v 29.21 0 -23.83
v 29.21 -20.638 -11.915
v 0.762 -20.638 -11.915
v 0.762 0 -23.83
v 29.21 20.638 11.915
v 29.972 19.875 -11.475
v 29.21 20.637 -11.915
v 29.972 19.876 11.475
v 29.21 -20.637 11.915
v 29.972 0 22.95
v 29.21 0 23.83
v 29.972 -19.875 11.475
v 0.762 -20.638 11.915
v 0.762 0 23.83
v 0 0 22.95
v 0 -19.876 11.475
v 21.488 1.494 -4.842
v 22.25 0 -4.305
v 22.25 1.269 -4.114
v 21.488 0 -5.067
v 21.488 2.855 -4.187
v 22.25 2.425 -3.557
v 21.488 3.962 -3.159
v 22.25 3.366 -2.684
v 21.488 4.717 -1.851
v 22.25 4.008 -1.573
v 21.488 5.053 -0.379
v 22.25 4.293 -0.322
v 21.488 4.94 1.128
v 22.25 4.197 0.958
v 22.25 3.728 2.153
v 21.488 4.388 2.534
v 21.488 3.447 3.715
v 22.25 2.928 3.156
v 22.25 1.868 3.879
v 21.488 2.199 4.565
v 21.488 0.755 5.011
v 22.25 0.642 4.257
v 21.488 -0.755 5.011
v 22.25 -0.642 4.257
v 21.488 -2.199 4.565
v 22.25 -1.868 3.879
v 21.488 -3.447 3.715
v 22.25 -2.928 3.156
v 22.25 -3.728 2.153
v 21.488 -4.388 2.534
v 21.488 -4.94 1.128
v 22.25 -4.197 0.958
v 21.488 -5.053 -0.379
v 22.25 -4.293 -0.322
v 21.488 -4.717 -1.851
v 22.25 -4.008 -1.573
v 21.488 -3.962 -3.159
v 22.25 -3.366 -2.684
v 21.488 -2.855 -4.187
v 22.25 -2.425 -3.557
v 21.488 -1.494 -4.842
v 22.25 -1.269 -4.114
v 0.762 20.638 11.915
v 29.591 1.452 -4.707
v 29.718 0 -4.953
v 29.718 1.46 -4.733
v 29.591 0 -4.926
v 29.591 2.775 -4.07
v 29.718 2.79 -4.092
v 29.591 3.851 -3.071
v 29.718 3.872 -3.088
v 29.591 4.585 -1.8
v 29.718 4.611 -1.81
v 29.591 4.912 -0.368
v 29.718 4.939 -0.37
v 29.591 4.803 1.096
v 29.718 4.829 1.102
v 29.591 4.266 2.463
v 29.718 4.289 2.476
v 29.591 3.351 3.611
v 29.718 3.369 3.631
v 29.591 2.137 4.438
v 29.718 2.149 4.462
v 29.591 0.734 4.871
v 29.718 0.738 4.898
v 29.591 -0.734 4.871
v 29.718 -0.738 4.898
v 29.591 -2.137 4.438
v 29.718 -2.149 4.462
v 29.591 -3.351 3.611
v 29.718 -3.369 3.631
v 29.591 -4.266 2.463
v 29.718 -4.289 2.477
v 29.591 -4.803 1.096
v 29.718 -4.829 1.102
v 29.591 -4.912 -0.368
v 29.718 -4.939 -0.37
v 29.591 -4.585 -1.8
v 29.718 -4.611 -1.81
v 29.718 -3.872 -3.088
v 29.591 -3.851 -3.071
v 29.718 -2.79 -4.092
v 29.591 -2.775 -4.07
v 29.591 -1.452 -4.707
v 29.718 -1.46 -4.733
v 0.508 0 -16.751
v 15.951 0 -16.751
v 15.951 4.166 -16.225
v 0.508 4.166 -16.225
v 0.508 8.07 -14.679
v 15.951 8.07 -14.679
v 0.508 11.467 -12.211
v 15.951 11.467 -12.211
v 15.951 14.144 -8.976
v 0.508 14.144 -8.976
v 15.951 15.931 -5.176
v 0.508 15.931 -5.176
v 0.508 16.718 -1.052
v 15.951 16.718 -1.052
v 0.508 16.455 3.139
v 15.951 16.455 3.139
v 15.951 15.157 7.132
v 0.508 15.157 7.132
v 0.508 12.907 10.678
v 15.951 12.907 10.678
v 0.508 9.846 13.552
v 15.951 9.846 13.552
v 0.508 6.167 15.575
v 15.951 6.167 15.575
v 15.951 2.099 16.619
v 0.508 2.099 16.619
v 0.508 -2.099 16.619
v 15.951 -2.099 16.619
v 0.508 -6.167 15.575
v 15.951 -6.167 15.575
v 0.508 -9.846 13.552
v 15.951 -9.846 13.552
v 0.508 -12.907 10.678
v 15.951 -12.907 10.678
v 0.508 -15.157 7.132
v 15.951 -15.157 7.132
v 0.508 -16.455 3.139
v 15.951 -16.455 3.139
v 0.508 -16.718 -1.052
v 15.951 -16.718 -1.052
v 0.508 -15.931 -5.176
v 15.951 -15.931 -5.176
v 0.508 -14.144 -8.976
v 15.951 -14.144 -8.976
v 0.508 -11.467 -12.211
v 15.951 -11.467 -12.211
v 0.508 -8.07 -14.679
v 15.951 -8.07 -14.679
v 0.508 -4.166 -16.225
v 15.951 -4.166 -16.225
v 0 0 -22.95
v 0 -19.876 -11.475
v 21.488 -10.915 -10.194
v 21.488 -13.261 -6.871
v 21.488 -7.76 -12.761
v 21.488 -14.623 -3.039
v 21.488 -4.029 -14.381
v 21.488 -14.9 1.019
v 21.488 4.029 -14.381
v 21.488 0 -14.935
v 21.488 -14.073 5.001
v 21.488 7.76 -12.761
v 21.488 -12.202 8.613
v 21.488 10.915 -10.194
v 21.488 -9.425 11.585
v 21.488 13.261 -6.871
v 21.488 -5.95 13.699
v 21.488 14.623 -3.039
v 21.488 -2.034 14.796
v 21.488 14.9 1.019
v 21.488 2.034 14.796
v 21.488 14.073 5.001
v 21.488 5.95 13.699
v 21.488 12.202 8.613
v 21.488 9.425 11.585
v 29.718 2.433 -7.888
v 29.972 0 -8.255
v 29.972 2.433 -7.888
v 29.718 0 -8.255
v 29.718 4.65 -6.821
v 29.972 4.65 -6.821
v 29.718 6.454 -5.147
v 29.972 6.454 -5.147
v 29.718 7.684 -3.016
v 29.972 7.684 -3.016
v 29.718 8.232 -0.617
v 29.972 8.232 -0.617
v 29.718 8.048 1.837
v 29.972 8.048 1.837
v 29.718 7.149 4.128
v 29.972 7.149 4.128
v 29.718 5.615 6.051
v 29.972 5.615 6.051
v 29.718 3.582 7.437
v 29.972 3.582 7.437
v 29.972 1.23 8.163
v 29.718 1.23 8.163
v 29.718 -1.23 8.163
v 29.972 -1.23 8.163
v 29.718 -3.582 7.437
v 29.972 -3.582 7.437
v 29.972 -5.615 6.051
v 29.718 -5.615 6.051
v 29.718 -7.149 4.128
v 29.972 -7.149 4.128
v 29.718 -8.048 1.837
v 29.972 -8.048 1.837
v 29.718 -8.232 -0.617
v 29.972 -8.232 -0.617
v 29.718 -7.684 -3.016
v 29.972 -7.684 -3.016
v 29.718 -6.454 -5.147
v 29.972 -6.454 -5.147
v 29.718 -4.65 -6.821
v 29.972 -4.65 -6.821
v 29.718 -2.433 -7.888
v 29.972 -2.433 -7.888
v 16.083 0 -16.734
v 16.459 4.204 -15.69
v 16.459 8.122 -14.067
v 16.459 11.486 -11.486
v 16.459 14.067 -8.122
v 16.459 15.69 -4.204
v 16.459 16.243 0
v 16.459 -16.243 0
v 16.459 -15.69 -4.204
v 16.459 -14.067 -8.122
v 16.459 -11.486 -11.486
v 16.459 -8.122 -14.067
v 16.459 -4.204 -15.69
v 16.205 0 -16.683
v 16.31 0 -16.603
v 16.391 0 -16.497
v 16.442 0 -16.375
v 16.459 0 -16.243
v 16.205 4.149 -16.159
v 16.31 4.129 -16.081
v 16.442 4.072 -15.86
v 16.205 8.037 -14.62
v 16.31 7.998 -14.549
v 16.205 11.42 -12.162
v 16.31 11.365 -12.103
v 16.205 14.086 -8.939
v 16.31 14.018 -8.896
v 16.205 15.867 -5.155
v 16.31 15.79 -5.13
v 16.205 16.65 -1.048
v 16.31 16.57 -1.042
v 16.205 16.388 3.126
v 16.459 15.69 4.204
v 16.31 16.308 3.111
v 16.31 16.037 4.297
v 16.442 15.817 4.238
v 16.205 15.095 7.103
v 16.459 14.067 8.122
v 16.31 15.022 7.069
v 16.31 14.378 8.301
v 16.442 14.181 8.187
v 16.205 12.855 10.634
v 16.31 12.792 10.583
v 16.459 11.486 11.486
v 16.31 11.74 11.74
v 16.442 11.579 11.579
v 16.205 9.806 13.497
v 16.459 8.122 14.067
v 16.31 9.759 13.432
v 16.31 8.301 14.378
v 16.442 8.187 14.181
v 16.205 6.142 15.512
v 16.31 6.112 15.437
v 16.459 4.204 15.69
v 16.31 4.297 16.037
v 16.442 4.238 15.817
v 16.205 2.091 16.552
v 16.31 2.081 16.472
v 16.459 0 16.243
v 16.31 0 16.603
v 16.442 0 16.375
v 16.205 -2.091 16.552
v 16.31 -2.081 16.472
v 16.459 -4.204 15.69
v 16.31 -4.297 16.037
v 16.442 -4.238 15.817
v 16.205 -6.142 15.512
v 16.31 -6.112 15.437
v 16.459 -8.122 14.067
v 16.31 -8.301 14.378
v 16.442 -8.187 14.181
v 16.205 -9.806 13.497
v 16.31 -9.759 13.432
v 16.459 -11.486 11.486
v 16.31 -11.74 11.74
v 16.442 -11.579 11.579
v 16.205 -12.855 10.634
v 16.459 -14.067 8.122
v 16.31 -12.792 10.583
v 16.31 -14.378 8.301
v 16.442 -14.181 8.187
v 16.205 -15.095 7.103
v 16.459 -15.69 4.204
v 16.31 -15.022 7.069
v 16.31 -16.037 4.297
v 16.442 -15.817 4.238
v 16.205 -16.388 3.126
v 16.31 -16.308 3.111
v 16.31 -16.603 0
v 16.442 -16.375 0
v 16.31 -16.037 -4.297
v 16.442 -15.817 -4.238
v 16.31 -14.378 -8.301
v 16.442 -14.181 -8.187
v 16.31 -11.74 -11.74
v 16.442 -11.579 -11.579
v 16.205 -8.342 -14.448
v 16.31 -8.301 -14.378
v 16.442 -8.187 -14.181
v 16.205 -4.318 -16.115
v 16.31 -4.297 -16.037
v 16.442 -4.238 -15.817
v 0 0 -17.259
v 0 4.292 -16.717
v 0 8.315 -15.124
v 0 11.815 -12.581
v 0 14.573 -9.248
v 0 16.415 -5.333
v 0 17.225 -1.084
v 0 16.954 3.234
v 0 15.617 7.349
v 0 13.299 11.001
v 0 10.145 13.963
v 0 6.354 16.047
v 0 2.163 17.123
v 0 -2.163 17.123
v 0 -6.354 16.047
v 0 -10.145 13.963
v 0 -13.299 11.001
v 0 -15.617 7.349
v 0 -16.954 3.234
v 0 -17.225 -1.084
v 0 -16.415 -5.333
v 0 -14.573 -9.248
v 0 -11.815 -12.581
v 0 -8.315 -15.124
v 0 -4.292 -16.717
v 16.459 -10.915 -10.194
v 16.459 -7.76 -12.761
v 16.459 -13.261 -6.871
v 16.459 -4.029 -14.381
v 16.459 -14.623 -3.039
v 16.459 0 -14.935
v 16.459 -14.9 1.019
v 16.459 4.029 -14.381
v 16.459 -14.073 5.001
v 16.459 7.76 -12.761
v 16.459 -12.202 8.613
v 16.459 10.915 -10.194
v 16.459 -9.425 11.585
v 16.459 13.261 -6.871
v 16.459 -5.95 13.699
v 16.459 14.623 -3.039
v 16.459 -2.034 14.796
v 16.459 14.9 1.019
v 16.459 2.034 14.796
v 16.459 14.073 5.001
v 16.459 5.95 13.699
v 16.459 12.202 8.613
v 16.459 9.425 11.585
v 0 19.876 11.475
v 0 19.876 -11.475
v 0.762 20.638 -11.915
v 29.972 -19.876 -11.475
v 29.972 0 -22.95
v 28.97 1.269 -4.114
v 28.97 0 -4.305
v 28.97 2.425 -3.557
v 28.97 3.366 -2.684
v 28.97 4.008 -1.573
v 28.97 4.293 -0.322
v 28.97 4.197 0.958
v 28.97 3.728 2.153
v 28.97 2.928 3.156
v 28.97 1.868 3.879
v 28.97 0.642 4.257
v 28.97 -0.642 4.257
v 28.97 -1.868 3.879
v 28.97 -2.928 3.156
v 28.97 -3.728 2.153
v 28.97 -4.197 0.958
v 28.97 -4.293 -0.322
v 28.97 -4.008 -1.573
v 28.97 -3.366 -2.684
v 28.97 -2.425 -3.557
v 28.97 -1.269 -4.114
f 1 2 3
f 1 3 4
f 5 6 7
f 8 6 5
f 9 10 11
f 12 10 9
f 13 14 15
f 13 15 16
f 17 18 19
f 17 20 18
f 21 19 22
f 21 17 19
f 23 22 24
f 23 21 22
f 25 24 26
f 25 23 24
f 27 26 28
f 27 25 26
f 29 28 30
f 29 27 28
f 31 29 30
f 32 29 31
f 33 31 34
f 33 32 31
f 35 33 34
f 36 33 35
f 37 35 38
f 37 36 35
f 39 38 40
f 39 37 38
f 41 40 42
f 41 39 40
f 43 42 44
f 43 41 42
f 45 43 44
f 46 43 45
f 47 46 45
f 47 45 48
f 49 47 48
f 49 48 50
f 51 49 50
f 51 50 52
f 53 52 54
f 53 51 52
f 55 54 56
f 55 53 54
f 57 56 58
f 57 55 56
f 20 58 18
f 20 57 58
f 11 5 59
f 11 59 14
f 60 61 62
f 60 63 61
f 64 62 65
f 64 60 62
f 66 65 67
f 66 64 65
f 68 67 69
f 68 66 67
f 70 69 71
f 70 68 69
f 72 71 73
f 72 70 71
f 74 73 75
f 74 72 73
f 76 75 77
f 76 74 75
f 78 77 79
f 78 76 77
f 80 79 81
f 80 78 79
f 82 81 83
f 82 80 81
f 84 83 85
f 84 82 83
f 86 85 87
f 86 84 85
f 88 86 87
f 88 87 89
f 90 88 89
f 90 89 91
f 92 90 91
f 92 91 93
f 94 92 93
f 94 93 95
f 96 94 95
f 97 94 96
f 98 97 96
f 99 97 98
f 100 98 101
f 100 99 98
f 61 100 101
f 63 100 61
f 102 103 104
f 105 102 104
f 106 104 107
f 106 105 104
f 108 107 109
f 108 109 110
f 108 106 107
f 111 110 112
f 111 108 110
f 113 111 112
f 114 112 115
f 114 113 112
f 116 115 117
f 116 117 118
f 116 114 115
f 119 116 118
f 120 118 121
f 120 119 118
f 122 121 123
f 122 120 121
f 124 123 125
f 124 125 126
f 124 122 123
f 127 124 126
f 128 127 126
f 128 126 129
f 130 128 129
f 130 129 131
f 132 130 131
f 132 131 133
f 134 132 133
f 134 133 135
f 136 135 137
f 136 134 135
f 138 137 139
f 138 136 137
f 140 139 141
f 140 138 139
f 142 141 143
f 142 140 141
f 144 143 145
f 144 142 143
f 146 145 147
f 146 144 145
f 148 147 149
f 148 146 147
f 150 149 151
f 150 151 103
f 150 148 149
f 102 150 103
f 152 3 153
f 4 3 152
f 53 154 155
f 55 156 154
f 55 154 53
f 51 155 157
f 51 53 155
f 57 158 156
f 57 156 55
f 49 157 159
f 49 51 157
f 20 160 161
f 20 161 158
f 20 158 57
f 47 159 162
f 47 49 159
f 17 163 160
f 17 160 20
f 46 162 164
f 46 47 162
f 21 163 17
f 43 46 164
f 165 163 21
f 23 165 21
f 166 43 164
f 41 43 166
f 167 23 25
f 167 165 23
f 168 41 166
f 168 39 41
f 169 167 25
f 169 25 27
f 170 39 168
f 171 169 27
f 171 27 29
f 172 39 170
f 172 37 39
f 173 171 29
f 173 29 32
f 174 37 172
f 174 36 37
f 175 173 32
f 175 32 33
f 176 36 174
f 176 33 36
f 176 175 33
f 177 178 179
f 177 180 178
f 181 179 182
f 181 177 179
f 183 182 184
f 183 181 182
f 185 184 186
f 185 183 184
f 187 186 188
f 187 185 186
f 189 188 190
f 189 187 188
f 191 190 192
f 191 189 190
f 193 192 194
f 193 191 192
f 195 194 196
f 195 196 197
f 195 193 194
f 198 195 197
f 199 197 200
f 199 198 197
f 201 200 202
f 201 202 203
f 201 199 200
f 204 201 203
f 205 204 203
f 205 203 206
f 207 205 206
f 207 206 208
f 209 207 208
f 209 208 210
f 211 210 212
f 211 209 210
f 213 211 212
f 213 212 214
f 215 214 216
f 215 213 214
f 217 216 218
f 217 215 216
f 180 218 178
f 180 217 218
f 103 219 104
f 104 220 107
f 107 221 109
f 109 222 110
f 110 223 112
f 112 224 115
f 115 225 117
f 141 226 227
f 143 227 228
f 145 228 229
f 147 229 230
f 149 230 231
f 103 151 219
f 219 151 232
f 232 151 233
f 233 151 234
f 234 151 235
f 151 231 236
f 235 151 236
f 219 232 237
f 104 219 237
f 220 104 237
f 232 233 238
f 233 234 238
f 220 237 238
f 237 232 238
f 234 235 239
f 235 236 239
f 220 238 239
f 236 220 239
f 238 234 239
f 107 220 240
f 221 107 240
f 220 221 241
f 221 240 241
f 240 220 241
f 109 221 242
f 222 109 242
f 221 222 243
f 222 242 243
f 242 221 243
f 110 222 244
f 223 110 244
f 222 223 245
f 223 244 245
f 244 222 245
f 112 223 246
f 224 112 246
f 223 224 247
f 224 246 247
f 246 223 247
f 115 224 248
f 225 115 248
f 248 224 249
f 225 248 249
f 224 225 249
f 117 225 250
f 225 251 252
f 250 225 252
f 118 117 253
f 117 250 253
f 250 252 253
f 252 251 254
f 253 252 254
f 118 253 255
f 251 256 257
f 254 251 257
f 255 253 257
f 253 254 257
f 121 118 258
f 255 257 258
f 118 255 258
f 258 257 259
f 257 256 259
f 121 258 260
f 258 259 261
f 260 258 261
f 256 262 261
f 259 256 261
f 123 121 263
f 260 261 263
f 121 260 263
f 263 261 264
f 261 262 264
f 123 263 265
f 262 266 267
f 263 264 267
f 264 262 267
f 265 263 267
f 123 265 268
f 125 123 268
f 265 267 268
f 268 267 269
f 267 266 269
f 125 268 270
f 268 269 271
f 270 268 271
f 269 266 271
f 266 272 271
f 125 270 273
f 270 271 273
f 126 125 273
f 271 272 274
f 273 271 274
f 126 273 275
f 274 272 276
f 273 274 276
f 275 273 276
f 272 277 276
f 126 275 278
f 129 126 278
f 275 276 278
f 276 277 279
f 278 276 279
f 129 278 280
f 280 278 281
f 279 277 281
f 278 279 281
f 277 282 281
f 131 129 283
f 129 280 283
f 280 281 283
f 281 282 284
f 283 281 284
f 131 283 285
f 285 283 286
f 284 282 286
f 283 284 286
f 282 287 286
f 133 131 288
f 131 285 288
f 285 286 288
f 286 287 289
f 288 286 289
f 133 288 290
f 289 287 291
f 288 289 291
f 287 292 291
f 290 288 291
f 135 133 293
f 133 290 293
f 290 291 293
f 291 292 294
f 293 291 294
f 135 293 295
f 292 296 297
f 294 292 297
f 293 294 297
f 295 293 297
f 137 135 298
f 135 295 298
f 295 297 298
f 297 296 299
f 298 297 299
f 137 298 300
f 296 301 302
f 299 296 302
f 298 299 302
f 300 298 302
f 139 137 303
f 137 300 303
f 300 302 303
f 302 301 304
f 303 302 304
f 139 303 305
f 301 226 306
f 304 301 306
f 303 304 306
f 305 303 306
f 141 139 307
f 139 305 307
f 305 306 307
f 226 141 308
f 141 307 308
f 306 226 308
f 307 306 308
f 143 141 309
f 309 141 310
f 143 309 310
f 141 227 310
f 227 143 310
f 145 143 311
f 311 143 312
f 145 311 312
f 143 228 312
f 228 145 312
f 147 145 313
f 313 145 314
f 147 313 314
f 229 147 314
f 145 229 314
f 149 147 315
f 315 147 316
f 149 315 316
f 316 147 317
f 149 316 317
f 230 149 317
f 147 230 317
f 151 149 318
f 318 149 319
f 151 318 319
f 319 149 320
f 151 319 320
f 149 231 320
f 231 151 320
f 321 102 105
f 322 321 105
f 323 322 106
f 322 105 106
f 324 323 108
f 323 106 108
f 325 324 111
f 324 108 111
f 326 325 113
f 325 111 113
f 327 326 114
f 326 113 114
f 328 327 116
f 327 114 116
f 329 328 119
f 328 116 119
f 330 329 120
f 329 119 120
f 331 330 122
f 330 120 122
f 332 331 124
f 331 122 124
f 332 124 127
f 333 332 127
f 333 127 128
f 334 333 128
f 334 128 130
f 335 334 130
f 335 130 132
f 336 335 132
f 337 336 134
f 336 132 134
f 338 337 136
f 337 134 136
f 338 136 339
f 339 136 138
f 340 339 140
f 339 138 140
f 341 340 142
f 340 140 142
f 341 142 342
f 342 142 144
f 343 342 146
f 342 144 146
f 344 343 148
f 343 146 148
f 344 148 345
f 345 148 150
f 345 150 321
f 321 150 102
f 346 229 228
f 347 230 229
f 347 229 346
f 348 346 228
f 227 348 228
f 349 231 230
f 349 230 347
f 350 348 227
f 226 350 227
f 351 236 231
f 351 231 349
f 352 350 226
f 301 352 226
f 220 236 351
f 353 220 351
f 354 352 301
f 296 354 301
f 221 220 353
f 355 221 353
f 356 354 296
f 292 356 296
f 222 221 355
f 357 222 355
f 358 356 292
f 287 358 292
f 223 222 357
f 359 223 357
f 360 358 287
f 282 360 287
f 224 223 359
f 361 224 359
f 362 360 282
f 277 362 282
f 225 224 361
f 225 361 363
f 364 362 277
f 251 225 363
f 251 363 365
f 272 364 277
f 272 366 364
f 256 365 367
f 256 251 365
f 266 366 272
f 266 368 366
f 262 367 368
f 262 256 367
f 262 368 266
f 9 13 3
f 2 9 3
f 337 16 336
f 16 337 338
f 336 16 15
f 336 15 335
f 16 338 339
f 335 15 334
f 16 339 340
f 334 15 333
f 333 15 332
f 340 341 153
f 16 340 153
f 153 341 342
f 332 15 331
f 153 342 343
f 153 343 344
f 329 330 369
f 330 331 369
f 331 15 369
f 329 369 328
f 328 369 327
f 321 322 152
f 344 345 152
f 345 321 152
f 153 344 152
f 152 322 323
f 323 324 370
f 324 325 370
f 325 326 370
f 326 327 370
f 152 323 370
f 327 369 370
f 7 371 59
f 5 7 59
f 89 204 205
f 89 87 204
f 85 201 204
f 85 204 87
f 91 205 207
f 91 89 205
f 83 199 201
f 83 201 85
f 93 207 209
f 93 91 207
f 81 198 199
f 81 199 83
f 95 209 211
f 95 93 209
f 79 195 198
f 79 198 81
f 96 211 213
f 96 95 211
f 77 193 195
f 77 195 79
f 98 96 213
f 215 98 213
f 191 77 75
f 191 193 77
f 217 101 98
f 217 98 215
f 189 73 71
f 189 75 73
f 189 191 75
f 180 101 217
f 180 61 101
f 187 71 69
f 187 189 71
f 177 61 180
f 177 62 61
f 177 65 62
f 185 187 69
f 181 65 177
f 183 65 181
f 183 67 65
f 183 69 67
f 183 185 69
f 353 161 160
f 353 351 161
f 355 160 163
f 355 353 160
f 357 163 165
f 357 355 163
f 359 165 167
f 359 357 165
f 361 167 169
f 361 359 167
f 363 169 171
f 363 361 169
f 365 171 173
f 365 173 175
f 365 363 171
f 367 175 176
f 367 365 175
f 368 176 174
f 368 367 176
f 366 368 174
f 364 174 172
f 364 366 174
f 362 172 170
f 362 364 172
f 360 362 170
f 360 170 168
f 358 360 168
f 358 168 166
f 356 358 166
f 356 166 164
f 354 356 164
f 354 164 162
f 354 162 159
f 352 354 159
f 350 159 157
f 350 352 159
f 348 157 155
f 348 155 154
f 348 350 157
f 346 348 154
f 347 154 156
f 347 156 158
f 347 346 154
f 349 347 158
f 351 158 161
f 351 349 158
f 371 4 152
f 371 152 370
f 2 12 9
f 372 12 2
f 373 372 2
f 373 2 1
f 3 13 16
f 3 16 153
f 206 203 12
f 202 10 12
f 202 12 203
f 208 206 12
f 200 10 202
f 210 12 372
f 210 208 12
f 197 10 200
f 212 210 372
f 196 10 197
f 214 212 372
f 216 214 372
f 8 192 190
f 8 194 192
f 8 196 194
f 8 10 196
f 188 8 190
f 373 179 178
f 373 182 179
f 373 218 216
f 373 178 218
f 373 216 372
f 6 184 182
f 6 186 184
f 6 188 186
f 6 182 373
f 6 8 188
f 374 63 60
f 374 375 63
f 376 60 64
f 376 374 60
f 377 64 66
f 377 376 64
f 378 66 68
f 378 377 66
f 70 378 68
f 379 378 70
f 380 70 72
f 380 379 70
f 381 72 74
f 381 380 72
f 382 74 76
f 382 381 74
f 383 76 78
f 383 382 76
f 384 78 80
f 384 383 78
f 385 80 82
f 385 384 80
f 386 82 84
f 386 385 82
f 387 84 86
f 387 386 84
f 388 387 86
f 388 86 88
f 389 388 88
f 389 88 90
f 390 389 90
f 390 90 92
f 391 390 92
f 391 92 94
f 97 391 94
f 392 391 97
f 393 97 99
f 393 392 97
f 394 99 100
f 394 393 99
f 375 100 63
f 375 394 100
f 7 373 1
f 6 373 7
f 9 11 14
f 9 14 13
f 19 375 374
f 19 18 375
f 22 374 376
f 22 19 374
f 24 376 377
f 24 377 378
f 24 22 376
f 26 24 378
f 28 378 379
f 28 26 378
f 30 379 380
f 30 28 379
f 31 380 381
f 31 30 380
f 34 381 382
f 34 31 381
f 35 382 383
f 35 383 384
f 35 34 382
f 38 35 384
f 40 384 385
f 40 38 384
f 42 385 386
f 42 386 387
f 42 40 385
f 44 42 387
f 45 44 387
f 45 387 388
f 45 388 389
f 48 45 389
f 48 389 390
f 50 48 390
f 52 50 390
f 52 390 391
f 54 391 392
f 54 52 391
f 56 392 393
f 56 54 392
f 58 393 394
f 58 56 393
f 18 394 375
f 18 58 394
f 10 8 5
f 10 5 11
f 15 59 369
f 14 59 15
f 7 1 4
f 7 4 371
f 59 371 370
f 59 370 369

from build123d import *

# Parameters (mm, degrees)
EXTRUDE1_DEPTH = 29.972
CHAMFER1_SIZE  = 0.508
CHAMFER3_SIZE  = 0.762
CHAMFER4_SIZE  = 0.762
FILLET1_R      = 0.508


with BuildPart() as part:
    # Sketch1 → Extrude1 (new body)
    with BuildSketch(Plane(origin=(0, 0, 0), x_dir=(0, 0, -1), z_dir=(1, 0, 0))):
        Polygon((11.91506618, 20.6375), (-11.91506618, 20.6375), (-23.830132361, 0), (-11.91506618, -20.6375), (11.91506618, -20.6375), (23.830132361, 0), align=None)
    extrude(amount=EXTRUDE1_DEPTH)

    # Sketch2 → Cut-Revolve1 (revolve, cut)
    with BuildSketch(Plane.XY, mode=Mode.PRIVATE) as cut_revolve1_sk:
        Polygon((0, 16.7513), (0, 0), (29.972, 0), (29.972, 8.255), (29.718, 8.255), (29.718, 4.953), (29.591, 4.926005317), (28.970294683, 4.3053), (22.2504, 4.3053), (21.4884, 5.0673), (21.4884, 14.9352), (16.4592, 14.9352), (16.4592, 16.7513), align=None)
    revolve(cut_revolve1_sk.sketch.rotate(Axis((0, 0, 0), (1, 0, 0)), 270), axis=Axis((0, 0, 0), (1, 0, 0)), mode=Mode.SUBTRACT)  # turned: the seam where the file's is

    # Chamfer1
    chamfer1_edges = [part.edges().sort_by_distance(p)[0] for p in [
        (0, 0, 16.7513),
    ]]
    chamfer(chamfer1_edges, length=CHAMFER1_SIZE)

    # Chamfer3
    chamfer3_edges = [part.edges().sort_by_distance(p)[0] for p in [
        (0, -10.31875, -17.872599271),
        (0, -20.6375, 0),
        (0, -10.31875, 17.872599271),
        (0, 10.31875, 17.872599271),
        (0, 20.6375, 0),
        (0, 10.31875, -17.872599271),
    ]]
    chamfer(chamfer3_edges, length=CHAMFER3_SIZE)

    # Chamfer4
    chamfer4_edges = [part.edges().sort_by_distance(p)[0] for p in [
        (29.972, 10.31875, 17.872599271),
        (29.972, -10.31875, 17.872599271),
        (29.972, -20.6375, 0),
        (29.972, -10.31875, -17.872599271),
        (29.972, 10.31875, -17.872599271),
        (29.972, 20.6375, 0),
    ]]
    chamfer(chamfer4_edges, length=CHAMFER4_SIZE)

    # Fillet1
    fillet1_edges = [part.edges().sort_by_distance(p)[0] for p in [
        (16.4592, 0, 16.7513),
    ]]
    fillet(fillet1_edges, radius=FILLET1_R)


solid = part.part
